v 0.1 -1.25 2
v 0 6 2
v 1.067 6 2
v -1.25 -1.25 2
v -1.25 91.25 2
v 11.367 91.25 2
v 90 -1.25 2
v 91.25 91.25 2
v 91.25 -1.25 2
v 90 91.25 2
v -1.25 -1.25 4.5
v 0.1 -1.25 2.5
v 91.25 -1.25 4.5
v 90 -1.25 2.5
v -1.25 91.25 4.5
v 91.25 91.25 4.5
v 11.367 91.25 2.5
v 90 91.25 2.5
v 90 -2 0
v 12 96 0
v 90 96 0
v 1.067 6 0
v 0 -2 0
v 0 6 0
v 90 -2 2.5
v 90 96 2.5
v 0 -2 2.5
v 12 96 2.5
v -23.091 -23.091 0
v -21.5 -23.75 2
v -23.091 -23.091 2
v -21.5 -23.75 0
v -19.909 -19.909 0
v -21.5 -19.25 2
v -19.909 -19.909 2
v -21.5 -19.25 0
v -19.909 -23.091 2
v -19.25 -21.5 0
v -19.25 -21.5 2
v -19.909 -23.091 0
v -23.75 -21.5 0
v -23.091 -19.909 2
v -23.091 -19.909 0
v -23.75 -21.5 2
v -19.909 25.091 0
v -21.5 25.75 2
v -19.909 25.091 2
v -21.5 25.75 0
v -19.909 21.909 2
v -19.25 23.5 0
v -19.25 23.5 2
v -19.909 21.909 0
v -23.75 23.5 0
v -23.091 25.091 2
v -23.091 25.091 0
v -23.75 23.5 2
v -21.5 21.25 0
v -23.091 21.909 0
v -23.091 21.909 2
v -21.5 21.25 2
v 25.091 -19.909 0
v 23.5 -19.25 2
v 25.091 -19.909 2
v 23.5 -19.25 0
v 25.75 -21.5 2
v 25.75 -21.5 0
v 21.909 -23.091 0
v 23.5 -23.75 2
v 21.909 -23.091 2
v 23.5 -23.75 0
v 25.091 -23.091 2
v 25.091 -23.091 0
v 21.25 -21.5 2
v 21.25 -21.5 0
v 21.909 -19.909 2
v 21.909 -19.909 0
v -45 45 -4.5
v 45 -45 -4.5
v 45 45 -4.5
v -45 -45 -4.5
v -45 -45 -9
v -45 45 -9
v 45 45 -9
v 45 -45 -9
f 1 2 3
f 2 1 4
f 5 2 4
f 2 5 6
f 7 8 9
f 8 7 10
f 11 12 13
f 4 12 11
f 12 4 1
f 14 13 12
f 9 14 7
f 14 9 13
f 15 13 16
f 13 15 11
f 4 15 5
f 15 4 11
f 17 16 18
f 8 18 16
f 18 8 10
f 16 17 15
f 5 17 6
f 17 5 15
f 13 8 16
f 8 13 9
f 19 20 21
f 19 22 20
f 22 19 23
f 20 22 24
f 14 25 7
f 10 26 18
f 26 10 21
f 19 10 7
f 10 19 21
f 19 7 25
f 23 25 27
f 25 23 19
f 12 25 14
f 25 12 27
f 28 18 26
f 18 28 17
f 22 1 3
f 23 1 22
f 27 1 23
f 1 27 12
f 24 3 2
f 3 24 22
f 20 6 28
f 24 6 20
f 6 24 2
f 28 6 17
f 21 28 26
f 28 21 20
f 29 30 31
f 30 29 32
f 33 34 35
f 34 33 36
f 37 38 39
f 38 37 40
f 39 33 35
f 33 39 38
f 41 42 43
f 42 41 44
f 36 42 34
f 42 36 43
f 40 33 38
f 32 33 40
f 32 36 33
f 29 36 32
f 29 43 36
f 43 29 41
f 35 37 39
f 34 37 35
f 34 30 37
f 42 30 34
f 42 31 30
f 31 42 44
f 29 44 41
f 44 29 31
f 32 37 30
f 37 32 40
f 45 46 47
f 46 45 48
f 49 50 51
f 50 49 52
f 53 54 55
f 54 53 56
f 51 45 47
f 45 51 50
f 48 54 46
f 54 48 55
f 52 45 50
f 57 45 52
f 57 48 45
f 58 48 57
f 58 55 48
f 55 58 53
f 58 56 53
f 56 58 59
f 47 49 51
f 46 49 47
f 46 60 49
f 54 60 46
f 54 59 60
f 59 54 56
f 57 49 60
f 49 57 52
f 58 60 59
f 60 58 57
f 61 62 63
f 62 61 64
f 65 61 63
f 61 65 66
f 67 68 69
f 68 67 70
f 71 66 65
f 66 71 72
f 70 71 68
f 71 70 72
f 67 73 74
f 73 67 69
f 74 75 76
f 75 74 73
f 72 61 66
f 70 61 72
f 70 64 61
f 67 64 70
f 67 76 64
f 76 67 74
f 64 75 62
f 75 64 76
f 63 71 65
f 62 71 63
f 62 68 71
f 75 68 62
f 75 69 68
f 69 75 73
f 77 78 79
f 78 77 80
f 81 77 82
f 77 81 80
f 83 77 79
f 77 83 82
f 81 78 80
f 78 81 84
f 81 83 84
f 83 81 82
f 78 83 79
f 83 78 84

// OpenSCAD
// Dimensions in mm
top_plate_thickness = 2;
wall_thickness = 2.5;
outer_size_x = 90;
outer_size_y = 90;
hole_diameter = 4.5;
screw_pattern_square_side = sqrt((outer_size_x / 2) * (outer_size_y / 2));
power_cable_notch_width = 12;
power_cable_notch_depth = 8;

// Top plate
translate([0, 0, top_plate_thickness])
    linear_extrude(top_plate_thickness)
        polygon(points=[[0, 0], [outer_size_x, 0], [outer_size_x, outer_size_y], [0, outer_size_y]]);

// Walls
for (x = [-wall_thickness/2, wall_thickness/2]) {
    for (y = [-wall_thickness/2, wall_thickness/2]) {
        translate([x, y, top_plate_thickness])
            linear_extrude(wall_thickness)
                polygon(points=[[0, 0], [outer_size_x, 0], [outer_size_x, outer_size_y], [0, outer_size_y]]);
    }
}

// Power cable notch
for (y = [-power_cable_notch_depth/2, power_cable_notch_depth/2]) {
    translate([0, y + top_plate_thickness])
        linear_extrude(wall_thickness)
            polygon(points=[[0, 0], [outer_size_x, 0], [outer_size_x, outer_size_y], [power_cable_notch_width, outer_size_y]]);
}

// M4 screw holes
for (x = [-screw_pattern_square_side/2, screw_pattern_square_side/2]) {
    for (y = [-screw_pattern_square_side/2, screw_pattern_square_side/2]) {
        translate([x + top_plate_thickness/2, y + top_plate_thickness/2])
            linear_extrude(top_plate_thickness)
                circle(r=hole_diameter/2);
    }
}

// Mirror to flip the model
mirror([0, 0, 1])
    // Fan mounting holes are at the bottom of the box, so we need to mirror this part as well
    translate([-outer_size_x/2, -outer_size_y/2, top_plate_thickness + wall_thickness])
        linear_extrude(top_plate_thickness + wall_thickness)
            polygon(points=[[0, 0], [outer_size_x, 0], [outer_size_x, outer_size_y], [0, outer_size_y]]);
